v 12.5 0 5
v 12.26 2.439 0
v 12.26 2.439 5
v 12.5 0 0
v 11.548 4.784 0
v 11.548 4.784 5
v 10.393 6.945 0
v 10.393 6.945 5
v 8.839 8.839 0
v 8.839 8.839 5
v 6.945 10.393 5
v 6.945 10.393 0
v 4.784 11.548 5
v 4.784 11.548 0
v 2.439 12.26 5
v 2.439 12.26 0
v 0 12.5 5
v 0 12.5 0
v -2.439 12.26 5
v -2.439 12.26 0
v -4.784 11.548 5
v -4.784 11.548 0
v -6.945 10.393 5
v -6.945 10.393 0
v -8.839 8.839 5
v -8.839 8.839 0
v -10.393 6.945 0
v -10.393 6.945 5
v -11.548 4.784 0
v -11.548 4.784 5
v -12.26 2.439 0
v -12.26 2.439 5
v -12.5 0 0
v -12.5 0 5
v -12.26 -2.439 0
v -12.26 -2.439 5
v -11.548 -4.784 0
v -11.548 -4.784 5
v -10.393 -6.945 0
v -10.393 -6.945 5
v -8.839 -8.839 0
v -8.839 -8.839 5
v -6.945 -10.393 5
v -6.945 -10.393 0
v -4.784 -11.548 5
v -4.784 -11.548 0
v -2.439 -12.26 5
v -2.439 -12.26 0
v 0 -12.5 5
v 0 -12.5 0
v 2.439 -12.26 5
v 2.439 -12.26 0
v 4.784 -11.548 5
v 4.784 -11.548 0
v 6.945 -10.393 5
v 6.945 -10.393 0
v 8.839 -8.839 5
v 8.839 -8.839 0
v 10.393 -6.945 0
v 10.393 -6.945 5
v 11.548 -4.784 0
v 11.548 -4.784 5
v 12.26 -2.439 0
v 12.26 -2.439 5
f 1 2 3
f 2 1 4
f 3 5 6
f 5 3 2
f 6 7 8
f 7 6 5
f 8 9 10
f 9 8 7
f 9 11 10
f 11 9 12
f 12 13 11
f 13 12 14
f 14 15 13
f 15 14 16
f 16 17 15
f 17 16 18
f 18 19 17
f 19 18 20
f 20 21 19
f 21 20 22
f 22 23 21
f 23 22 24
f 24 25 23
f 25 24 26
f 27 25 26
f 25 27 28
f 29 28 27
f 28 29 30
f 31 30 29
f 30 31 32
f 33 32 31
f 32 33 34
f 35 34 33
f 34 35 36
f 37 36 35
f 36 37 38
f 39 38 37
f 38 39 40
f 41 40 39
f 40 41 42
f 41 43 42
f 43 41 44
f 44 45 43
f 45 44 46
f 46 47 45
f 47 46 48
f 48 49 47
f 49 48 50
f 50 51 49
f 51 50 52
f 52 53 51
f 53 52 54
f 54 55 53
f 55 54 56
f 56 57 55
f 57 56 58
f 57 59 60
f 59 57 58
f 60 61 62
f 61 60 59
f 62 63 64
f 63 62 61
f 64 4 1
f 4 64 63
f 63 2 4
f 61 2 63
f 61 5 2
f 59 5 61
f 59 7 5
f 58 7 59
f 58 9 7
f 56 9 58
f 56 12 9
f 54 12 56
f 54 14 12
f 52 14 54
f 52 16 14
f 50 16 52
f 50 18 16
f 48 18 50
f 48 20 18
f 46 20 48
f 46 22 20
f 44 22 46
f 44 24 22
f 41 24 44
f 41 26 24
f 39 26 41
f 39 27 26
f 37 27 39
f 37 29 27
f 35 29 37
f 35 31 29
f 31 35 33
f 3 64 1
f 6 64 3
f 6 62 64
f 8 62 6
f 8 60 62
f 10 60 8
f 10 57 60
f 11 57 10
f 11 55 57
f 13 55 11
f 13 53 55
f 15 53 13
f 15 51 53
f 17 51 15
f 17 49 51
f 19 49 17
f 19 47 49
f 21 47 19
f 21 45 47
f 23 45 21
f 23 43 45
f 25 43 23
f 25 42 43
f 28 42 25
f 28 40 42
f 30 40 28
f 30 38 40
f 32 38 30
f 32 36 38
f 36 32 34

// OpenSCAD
// Customizer-style parameters with annotations.
/* [Dimensions] */
// Length of the part
length = 50; // [10:1:100]
// Shape
shape = "round"; // [round, square]
/* [Hidden] */
eps = 0.01;
if (shape == "round")
  cylinder(d = length / 2, h = 5, $fn = 32);
else
  cube([length, length / 2, 5]);
echo(length = length, shape = shape);
